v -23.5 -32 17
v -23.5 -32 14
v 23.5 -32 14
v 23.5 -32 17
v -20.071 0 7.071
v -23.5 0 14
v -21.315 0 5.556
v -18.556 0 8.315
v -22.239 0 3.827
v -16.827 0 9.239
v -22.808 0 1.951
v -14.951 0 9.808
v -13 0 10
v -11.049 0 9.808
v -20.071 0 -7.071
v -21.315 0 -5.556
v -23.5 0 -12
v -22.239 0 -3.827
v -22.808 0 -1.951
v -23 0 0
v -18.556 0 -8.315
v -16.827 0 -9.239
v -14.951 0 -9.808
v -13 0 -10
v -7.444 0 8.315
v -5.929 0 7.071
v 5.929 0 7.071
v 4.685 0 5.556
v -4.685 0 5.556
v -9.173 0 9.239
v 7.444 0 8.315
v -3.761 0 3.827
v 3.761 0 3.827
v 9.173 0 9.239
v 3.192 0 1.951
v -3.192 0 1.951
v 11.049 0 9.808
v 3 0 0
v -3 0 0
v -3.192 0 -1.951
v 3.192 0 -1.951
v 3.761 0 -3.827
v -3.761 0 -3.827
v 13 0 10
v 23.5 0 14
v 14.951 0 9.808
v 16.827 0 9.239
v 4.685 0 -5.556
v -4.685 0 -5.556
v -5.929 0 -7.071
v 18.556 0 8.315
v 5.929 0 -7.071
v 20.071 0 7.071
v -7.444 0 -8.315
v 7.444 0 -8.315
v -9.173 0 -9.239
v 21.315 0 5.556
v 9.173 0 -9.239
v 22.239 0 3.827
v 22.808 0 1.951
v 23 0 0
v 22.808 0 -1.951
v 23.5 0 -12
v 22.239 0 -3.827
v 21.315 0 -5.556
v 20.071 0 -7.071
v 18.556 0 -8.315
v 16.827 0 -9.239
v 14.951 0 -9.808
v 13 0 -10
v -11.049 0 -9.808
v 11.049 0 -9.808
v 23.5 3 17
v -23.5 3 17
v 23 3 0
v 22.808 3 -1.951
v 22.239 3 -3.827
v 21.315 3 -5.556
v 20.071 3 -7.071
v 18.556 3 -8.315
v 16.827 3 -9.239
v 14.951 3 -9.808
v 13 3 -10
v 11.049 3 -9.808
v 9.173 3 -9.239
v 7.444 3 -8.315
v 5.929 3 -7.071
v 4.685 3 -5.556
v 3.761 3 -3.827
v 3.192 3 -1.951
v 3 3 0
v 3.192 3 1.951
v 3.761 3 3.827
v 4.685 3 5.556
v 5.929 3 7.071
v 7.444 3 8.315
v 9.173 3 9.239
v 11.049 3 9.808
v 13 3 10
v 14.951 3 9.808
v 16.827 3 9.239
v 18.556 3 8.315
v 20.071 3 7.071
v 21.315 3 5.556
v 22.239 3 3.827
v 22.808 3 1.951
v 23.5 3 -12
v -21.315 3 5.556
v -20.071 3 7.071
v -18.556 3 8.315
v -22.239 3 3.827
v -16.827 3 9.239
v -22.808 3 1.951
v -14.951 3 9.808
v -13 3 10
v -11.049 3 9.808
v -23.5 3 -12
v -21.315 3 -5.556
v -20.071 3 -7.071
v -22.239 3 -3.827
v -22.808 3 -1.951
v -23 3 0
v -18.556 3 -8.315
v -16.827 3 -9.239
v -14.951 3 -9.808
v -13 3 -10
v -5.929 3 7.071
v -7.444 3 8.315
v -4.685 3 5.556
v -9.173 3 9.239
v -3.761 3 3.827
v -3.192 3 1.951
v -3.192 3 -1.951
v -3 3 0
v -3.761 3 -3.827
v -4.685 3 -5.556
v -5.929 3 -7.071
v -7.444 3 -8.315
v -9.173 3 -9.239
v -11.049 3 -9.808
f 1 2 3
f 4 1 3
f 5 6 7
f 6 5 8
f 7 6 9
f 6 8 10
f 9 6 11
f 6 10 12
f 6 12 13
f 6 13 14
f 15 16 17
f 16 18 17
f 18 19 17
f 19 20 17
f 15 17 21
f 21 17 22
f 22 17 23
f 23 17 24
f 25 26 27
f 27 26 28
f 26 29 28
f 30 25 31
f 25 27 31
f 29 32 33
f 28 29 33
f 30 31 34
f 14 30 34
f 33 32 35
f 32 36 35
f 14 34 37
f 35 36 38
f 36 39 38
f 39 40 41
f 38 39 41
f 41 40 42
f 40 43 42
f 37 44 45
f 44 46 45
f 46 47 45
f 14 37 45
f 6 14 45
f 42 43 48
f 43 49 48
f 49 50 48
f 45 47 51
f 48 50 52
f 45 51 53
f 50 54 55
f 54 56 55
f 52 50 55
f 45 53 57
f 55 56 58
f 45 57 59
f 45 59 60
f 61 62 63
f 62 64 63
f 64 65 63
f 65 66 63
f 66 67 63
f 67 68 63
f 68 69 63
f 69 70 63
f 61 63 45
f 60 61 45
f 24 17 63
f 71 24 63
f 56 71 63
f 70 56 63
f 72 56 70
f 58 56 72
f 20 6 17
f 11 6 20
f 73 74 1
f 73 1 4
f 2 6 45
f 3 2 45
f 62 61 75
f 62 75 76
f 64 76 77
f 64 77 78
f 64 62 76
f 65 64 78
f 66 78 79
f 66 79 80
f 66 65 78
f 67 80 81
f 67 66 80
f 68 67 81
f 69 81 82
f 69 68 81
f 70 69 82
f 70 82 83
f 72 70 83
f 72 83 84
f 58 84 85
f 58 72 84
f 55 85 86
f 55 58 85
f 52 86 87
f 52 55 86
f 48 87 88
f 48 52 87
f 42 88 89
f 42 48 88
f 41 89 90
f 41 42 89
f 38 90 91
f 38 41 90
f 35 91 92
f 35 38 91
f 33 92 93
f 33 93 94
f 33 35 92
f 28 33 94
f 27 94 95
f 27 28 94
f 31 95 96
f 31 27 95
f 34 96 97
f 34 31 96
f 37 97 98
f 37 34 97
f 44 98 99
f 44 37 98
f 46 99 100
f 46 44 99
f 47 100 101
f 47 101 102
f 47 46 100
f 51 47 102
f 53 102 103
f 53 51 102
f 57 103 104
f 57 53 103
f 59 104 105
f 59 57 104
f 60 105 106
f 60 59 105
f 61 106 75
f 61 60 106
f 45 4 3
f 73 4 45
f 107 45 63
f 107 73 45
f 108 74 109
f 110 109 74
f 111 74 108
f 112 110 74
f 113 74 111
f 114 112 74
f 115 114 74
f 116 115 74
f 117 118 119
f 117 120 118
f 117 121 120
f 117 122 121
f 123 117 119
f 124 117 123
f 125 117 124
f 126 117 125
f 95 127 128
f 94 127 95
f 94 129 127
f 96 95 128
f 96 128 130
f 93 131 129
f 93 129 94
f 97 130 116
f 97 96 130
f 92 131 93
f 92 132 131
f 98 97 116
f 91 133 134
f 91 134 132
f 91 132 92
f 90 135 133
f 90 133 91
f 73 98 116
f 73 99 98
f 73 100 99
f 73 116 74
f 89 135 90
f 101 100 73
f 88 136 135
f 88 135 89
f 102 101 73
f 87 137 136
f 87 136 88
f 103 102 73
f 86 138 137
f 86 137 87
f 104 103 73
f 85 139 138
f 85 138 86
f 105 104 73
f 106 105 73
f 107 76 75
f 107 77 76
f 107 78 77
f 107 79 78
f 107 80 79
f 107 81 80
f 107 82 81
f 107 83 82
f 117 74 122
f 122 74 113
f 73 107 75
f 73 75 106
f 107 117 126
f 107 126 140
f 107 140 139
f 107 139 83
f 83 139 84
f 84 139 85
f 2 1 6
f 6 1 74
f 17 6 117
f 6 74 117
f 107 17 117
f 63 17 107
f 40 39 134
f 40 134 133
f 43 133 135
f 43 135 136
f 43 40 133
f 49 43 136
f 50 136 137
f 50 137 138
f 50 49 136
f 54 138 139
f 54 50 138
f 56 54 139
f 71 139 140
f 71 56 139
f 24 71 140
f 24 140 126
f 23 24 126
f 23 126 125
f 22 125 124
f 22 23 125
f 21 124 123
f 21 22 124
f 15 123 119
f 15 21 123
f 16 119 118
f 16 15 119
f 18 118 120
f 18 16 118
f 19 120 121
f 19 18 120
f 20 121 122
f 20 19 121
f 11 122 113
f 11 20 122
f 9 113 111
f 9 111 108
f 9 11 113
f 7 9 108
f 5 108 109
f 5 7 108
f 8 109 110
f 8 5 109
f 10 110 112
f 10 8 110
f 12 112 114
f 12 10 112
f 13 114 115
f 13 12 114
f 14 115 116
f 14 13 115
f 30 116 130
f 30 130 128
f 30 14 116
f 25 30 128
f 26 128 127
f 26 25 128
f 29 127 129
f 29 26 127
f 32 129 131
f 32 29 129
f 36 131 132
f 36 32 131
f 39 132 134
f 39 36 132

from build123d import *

# Parameters (mm, degrees)
SKETCH1_W           = 47
SKETCH1_H           = 24
SKETCH1_R           = 10
BOSS_EXTRUDE1_DEPTH = 3
SKETCH2_W           = 47
SKETCH2_H           = 2
BOSS_EXTRUDE2_DEPTH = 3
SKETCH3_W           = 47
SKETCH3_H           = 3
BOSS_EXTRUDE6_DEPTH = 35


with BuildPart() as part:
    # Sketch1 → Boss-Extrude1 (new body)
    with BuildSketch(Plane(origin=(0, 0, 0), x_dir=(1, 0, 0), z_dir=(0, 1, 0))):
        Rectangle(SKETCH1_W, SKETCH1_H)
        with Locations((-13, 0)):
            Circle(SKETCH1_R, mode=Mode.SUBTRACT)
        with Locations((13, 0)):
            Circle(SKETCH1_R, mode=Mode.SUBTRACT)
    extrude(amount=BOSS_EXTRUDE1_DEPTH)

    # Sketch2 → Boss-Extrude2 (add)
    with BuildSketch(Plane(origin=(0, 3, 0), x_dir=(1, 0, 0), z_dir=(0, 1, 0))):
        with Locations((0, -13)):
            Rectangle(SKETCH2_W, SKETCH2_H)
    extrude(amount=-BOSS_EXTRUDE2_DEPTH)

    # Sketch3 → Boss-Extrude6 (add)
    with BuildSketch(Plane(origin=(0, 3, 0), x_dir=(1, 0, 0), z_dir=(0, 1, 0))):
        with Locations((0, -15.5)):
            Rectangle(SKETCH3_W, SKETCH3_H)
    extrude(amount=-BOSS_EXTRUDE6_DEPTH)


solid = part.part
